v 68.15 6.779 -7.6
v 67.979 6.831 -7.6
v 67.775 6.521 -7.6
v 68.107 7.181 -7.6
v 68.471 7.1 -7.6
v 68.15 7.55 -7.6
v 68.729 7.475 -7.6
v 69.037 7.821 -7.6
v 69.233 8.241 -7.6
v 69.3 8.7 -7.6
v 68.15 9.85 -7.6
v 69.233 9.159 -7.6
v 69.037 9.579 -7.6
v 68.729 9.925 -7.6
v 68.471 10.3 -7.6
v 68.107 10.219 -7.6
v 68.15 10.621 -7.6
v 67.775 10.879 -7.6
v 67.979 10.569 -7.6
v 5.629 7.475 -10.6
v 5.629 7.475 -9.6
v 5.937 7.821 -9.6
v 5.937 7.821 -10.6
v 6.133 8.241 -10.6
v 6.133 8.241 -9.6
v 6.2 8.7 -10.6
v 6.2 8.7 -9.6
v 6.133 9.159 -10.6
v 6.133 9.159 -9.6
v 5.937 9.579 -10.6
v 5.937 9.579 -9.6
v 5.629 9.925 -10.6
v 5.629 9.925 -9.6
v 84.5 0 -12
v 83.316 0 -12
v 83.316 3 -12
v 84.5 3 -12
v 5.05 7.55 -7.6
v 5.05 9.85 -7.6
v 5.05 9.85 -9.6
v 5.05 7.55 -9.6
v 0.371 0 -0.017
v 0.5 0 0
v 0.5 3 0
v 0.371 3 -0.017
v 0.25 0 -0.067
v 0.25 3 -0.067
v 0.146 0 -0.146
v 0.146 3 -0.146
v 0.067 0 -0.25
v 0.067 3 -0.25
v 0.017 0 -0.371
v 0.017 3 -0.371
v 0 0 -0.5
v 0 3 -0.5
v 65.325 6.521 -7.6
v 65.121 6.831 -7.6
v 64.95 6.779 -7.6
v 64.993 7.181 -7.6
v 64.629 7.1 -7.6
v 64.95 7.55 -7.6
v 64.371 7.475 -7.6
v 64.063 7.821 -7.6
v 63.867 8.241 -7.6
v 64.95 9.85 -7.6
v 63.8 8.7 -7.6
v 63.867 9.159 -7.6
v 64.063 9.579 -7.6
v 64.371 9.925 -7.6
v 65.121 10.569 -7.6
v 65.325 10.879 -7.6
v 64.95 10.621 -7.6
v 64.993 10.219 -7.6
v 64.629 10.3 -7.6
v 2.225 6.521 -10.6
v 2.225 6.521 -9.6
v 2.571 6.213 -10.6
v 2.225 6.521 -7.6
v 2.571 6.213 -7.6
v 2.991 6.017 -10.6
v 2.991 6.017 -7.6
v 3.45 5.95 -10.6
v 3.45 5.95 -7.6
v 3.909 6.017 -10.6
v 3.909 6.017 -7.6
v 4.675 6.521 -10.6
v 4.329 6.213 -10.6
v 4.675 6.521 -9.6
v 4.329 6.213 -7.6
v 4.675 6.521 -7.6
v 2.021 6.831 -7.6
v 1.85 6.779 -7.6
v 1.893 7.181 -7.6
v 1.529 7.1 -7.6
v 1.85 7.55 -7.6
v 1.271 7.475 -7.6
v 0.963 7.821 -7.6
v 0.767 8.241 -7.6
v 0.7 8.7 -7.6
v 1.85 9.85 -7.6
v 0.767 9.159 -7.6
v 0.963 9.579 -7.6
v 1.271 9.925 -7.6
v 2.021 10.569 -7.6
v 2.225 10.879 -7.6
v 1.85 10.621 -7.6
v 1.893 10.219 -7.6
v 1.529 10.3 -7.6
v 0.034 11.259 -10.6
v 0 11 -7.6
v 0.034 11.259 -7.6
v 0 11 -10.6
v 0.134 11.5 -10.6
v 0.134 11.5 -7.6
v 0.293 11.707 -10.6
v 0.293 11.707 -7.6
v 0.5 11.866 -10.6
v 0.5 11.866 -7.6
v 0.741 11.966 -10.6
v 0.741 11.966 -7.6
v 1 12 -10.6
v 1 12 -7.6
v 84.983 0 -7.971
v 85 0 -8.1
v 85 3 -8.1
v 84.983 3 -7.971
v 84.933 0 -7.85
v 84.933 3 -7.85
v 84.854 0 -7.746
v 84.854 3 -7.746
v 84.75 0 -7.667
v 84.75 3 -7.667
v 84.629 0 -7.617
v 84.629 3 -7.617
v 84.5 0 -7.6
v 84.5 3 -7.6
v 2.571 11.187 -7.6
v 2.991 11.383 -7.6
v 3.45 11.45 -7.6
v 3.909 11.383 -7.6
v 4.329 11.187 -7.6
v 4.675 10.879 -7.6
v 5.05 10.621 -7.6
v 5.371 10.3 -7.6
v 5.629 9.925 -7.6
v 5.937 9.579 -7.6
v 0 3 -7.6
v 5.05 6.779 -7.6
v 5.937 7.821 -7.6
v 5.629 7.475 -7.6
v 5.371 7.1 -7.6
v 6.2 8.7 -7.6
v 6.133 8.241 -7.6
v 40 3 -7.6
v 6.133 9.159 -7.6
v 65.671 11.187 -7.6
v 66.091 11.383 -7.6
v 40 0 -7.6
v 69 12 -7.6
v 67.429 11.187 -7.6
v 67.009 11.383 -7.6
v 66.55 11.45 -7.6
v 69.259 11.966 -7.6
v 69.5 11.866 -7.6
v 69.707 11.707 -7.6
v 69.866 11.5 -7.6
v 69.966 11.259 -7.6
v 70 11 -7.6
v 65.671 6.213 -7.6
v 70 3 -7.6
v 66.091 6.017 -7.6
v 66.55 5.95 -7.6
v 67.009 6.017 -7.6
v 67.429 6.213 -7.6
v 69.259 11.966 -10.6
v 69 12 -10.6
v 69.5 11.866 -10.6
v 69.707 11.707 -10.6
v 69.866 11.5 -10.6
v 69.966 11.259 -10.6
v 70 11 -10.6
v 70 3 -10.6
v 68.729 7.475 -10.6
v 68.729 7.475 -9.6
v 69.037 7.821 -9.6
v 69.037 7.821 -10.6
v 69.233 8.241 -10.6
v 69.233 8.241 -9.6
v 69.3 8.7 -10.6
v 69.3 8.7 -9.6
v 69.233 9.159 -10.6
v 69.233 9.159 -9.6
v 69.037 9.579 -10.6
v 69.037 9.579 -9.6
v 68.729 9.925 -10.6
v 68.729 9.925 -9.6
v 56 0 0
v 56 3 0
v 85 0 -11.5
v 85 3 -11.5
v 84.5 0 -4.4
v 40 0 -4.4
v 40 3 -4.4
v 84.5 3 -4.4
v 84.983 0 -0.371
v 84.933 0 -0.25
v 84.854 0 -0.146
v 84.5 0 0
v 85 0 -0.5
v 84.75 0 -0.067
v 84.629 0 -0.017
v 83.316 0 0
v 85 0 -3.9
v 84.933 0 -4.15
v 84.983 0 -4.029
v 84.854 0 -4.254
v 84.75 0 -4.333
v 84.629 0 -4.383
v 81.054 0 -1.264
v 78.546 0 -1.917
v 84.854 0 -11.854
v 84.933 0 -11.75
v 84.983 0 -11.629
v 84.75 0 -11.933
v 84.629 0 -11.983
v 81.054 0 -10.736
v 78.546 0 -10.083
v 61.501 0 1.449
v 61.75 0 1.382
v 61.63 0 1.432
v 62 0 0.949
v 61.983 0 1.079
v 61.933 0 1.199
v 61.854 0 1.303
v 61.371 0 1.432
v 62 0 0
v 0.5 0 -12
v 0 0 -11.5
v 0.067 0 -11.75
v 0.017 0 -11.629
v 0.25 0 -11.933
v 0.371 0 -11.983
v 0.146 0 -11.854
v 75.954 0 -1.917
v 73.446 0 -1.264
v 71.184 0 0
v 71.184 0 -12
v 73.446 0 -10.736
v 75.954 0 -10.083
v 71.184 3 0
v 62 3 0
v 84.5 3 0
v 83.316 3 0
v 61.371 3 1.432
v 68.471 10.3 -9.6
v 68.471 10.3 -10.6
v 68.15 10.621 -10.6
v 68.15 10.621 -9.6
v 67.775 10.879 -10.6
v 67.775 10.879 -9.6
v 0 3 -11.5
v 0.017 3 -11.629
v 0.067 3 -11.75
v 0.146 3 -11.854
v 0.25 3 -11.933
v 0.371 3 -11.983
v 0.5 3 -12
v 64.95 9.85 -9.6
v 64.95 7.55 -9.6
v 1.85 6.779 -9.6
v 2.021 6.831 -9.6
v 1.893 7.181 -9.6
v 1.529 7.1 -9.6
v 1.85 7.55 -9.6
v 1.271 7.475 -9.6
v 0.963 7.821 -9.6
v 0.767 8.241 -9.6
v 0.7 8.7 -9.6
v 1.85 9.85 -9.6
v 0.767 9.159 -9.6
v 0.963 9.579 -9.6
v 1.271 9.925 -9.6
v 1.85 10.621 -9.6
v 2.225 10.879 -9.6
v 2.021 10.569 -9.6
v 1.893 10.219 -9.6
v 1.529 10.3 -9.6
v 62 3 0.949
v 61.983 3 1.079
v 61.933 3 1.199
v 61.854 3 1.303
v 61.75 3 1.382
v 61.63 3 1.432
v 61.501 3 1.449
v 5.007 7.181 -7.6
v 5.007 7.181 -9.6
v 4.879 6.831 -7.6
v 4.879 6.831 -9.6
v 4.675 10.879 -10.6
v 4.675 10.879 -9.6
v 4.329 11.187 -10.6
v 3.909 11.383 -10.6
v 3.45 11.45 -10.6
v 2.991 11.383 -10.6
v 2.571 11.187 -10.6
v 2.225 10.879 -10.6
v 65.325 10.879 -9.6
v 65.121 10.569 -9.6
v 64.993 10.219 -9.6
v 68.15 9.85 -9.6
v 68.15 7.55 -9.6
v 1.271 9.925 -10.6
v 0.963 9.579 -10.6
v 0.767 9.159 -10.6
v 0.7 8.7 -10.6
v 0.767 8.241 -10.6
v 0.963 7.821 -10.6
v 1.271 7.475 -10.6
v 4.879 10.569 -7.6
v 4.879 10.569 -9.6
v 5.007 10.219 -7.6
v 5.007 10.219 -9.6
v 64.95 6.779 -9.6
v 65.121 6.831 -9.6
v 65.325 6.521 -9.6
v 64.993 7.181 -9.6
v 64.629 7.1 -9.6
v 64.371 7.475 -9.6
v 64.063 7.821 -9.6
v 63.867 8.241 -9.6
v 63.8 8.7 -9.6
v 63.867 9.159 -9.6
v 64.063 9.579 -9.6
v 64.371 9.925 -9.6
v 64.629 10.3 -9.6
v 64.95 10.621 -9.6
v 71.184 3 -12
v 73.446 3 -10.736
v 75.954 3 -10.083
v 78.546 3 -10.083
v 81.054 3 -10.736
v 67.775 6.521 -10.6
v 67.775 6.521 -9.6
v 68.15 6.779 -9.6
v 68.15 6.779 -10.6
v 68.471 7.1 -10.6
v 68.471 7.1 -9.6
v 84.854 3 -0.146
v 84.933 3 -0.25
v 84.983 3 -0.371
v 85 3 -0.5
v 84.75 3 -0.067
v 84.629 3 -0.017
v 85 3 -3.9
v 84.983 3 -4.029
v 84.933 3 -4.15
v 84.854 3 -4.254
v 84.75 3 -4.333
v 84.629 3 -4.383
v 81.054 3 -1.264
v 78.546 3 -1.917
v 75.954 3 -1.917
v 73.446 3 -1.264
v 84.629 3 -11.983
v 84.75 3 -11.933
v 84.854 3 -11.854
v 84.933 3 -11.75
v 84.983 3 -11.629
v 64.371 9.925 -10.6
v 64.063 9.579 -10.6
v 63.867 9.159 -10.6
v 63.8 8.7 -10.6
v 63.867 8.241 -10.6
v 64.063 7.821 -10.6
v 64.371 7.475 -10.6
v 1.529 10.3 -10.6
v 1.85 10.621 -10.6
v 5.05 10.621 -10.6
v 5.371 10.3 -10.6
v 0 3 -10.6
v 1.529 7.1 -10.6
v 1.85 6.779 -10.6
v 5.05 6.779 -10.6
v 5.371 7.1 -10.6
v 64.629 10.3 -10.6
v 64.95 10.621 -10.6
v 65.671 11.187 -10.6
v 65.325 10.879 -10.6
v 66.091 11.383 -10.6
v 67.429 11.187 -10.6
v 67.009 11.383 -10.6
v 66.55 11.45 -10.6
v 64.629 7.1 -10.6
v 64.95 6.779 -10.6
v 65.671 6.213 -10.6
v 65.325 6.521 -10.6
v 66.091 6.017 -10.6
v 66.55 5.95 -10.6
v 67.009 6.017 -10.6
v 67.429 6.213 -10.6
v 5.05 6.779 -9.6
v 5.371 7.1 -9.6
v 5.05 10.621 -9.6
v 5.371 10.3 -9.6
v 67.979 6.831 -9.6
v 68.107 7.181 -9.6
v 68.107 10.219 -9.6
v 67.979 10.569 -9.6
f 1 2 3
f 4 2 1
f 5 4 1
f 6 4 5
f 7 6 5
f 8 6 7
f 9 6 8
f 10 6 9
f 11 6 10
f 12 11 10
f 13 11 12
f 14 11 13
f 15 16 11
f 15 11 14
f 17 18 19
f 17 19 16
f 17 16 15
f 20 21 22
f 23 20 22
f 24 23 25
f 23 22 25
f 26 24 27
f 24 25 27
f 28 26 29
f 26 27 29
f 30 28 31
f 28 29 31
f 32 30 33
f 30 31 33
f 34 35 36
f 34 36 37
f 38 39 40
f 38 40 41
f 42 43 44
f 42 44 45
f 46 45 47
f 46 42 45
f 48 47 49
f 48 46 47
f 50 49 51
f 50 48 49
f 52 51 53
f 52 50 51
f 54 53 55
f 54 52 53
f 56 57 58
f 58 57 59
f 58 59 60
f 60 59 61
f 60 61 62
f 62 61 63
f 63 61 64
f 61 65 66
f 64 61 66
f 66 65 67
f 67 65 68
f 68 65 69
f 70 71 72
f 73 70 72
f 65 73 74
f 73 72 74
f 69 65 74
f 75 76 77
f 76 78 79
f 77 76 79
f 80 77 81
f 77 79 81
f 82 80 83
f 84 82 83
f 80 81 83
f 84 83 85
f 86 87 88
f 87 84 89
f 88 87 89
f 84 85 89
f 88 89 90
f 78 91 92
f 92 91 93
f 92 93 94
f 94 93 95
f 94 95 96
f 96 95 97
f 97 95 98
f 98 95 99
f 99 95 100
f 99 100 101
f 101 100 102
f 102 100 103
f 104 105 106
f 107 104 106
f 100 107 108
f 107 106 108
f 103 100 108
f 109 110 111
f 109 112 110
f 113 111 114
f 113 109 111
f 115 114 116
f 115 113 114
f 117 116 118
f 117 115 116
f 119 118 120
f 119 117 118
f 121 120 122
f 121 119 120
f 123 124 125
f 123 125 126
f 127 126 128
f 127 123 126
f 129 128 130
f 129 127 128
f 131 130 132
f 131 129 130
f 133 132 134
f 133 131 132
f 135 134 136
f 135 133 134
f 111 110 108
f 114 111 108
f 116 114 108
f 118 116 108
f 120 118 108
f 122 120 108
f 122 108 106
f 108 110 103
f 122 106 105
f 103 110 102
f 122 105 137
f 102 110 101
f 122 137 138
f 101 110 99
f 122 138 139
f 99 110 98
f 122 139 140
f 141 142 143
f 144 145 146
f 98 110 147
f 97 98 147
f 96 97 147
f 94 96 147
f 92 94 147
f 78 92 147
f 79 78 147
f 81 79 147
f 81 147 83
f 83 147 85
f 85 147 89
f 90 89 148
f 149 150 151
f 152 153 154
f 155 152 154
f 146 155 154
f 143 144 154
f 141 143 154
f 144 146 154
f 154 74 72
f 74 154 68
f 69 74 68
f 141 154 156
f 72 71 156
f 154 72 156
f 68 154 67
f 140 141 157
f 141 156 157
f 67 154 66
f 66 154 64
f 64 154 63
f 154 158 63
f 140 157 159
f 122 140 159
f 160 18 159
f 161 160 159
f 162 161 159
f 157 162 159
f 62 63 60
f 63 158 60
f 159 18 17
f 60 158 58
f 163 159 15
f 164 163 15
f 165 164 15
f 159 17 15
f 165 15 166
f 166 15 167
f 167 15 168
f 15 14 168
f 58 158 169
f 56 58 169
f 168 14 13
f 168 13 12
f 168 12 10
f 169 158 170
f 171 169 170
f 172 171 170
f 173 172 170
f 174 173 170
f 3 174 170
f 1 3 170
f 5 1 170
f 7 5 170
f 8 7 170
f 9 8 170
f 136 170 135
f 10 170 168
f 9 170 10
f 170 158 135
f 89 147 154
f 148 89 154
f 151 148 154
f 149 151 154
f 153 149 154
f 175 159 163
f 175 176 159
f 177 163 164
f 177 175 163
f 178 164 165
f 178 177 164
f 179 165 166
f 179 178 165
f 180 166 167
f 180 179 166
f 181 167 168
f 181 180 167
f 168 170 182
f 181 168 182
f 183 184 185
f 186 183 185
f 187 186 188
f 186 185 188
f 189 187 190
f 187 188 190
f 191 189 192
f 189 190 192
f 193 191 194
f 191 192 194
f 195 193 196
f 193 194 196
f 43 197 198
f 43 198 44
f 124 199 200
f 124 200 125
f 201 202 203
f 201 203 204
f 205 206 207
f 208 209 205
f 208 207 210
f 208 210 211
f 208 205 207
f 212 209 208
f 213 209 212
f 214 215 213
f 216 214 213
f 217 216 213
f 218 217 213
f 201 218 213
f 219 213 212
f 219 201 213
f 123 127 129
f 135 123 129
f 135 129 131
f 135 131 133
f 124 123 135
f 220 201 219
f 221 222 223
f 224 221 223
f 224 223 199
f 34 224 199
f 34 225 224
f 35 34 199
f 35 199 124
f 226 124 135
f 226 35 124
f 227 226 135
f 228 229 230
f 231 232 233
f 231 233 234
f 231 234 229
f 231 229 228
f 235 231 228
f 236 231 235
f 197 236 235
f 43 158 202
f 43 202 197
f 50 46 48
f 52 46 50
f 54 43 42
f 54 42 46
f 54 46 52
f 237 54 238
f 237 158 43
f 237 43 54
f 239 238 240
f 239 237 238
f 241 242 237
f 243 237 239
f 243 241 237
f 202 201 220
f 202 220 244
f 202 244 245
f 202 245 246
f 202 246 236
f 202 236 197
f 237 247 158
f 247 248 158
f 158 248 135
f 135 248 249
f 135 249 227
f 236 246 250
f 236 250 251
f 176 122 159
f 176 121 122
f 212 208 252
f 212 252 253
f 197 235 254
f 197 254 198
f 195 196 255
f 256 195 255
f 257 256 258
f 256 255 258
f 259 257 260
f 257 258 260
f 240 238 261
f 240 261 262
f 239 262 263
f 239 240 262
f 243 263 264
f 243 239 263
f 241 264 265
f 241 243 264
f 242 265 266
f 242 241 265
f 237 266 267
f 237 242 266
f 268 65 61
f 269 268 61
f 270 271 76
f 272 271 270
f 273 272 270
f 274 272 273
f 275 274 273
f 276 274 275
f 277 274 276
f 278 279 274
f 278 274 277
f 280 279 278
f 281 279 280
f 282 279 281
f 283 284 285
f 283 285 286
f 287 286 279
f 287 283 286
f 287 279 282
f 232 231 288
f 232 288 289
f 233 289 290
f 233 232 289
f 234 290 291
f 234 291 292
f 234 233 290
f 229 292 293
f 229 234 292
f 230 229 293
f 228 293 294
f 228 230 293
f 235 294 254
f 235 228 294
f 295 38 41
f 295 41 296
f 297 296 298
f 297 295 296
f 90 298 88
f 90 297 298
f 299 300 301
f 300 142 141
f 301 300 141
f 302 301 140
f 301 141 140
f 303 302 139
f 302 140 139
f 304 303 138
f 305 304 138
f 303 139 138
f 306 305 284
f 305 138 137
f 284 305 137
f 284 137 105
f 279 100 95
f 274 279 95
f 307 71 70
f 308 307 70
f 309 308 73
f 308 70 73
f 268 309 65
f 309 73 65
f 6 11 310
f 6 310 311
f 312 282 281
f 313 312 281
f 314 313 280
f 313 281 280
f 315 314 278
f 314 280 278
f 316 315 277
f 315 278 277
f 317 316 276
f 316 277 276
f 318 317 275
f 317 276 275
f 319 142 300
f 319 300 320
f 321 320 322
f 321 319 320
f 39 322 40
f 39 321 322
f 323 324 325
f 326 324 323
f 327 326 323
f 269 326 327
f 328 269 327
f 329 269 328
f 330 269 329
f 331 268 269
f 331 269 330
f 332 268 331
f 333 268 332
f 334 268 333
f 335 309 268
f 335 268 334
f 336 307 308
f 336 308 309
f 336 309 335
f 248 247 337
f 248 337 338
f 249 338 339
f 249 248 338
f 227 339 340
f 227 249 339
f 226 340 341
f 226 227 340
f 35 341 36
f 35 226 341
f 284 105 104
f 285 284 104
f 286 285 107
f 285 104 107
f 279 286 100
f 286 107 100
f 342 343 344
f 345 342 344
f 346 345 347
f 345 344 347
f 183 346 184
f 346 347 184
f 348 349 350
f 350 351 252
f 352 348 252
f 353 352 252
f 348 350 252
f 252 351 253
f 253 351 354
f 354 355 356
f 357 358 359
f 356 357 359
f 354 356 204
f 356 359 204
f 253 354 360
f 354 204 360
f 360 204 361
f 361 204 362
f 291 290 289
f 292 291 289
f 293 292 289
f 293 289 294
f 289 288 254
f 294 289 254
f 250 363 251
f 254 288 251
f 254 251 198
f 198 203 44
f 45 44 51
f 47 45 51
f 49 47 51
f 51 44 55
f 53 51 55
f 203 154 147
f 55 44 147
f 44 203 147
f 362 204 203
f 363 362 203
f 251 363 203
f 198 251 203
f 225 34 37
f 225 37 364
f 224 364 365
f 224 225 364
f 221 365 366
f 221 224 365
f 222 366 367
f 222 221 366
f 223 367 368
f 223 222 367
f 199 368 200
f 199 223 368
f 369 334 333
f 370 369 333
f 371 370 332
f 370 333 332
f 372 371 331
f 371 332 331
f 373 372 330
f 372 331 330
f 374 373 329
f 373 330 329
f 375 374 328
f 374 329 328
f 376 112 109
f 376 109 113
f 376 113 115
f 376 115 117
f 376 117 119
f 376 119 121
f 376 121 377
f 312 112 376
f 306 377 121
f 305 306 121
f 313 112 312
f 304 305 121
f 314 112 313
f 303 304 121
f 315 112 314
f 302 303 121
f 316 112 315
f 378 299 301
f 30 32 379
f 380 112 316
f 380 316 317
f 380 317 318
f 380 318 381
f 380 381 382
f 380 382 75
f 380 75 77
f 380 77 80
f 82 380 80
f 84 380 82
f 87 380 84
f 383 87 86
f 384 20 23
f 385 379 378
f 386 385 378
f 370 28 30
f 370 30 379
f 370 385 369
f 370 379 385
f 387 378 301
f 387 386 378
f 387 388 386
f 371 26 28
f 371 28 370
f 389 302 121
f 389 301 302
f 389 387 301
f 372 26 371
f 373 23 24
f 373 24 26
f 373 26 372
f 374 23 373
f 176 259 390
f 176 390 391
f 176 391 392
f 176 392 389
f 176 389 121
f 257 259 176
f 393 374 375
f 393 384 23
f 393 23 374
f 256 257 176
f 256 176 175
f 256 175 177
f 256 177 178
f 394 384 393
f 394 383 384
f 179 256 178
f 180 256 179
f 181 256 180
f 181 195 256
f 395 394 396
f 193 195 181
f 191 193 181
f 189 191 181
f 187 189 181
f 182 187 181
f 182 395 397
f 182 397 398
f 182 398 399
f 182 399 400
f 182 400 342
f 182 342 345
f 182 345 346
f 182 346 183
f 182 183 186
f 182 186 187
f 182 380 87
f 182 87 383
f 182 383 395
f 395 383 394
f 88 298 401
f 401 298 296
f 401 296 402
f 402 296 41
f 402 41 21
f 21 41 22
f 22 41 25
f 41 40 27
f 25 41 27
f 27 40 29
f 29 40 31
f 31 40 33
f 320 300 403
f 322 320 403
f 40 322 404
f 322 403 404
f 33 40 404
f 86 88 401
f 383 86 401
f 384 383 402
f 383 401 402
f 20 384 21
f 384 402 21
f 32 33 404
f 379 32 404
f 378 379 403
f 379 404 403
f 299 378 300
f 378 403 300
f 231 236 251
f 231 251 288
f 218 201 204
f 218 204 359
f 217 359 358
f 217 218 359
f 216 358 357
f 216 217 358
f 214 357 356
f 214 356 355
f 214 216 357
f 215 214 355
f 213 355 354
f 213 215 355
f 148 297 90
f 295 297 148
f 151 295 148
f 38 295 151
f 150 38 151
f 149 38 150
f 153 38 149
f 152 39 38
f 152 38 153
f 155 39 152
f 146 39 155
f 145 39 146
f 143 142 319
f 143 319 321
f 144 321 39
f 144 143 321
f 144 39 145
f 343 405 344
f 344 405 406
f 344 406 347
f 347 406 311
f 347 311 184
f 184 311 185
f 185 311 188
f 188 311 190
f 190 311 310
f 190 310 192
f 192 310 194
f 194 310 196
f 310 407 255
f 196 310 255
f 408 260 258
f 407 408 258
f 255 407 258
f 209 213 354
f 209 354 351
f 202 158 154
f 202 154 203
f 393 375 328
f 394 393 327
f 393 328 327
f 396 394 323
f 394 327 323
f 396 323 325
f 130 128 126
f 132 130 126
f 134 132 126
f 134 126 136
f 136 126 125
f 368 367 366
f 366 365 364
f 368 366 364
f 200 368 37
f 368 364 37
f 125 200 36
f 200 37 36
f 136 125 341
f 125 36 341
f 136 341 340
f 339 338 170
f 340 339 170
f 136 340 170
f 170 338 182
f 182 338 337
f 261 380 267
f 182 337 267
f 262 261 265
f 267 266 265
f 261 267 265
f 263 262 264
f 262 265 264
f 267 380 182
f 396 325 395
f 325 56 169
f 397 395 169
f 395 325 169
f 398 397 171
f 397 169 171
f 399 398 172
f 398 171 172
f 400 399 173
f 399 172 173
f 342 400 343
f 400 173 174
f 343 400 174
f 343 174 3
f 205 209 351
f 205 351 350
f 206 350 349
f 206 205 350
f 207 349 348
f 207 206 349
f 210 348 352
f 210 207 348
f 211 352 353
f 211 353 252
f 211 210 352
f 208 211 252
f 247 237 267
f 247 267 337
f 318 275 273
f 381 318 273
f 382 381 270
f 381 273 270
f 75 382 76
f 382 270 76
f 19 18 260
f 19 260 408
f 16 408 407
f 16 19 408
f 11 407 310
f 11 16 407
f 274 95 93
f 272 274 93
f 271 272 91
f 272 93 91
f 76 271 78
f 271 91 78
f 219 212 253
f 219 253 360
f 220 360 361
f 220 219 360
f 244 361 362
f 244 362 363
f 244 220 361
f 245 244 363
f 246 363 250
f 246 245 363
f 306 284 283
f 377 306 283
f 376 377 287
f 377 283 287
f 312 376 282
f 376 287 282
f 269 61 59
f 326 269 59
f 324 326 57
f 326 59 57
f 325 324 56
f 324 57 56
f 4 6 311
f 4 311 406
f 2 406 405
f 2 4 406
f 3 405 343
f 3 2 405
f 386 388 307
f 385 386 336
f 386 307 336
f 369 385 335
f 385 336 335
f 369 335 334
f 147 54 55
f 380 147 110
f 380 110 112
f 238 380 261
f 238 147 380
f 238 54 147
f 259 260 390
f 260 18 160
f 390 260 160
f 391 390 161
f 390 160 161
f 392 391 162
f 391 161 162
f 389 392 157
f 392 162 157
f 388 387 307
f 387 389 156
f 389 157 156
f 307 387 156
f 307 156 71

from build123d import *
from build123d.topology import SkipClean

# Parameters (mm, degrees)
EXTRUDE_1_DEPTH     = 3
SKETCH_4_W          = 70
SKETCH_4_H          = 3
EXTRUDE_2_DEPTH     = 9
CUT_EXTRUDE_1_REACH = 88.319
FILLET_1_R          = 1
EXTRUDE_3_DEPTH     = 2


with BuildPart() as part:
    # ｽｹｯﾁ2 → ﾎﾞｽ - 押し出し1 (new body)
    with BuildSketch(Plane(origin=(0, 0, 0), x_dir=(1, 0, 0), z_dir=(0, 1, 0))):
        with BuildLine():
            Line((70, 7.6), (40, 7.6))
            Line((40, 7.6), (40, 4.4))
            Line((40, 4.4), (70, 4.4))
            Line((70, 4.4), (84.5, 4.4))
            ThreePointArc((84.5, 4.4), (84.853553391, 4.253553391), (85, 3.9))
            Line((85, 3.9), (85, 0.5))
            ThreePointArc((85, 0.5), (84.853553391, 0.146446609), (84.5, 0))
            Line((84.5, 0), (83.316300355, 0))
            ThreePointArc((83.316300355, 0), (77.25, 2), (71.183699645, 0))
            Line((71.183699645, 0), (70, 0))
            Line((70, 0), (62, 0))
            Line((62, 0), (62, -0.949194177))
            ThreePointArc((62, -0.949194177), (61.80461807, -1.345688605), (61.371168675, -1.432311647))
            Line((61.371168675, -1.432311647), (56, 0))
            Line((56, 0), (0.5, 0))
            ThreePointArc((0.5, 0), (0.146446609, 0.146446609), (0, 0.5))
            Line((0, 0.5), (0, 11.5))
            ThreePointArc((0, 11.5), (0.146446609, 11.853553391), (0.5, 12))
            Line((0.5, 12), (70, 12))
            Line((70, 12), (71.183699645, 12))
            ThreePointArc((71.183699645, 12), (77.25, 10), (83.316300355, 12))
            Line((83.316300355, 12), (84.5, 12))
            ThreePointArc((84.5, 12), (84.853553391, 11.853553391), (85, 11.5))
            Line((85, 11.5), (85, 8.1))
            ThreePointArc((85, 8.1), (84.853553391, 7.746446609), (84.5, 7.6))
            Line((84.5, 7.6), (70, 7.6))
        make_face()
    extrude(amount=EXTRUDE_1_DEPTH)

    # ｽｹｯﾁ4 → ﾎﾞｽ - 押し出し2 (add)
    with BuildSketch(Plane(origin=(0, 3, 0), x_dir=(1, 0, 0), z_dir=(0, 1, 0))):
        with Locations((35, 9.1)):
            Rectangle(SKETCH_4_W, SKETCH_4_H)
    extrude(amount=EXTRUDE_2_DEPTH)

    # ｽｹｯﾁ5 → ｶｯﾄ - 押し出し1 (cut, up to next)
    with BuildSketch(Plane.XY.offset(-7.6), mode=Mode.PRIVATE) as cut_extrude_1_sk1:
        with BuildLine():
            ThreePointArc((64.370652174, 9.924925734), (63.8, 8.7), (64.370652174, 7.475074266))
            ThreePointArc((64.370652174, 7.475074266), (64.782233047, 6.932233047), (65.325074266, 6.520652174))
            ThreePointArc((65.325074266, 6.520652174), (66.55, 5.95), (67.774925734, 6.520652174))
            ThreePointArc((67.774925734, 6.520652174), (68.317766953, 6.932233047), (68.729347826, 7.475074266))
            ThreePointArc((68.729347826, 7.475074266), (69.3, 8.7), (68.729347826, 9.924925734))
            ThreePointArc((68.729347826, 9.924925734), (68.317766953, 10.467766953), (67.774925734, 10.879347826))
            ThreePointArc((67.774925734, 10.879347826), (66.55, 11.45), (65.325074266, 10.879347826))
            ThreePointArc((65.325074266, 10.879347826), (64.782233047, 10.467766953), (64.370652174, 9.924925734))
        make_face()
    cut_extrude_1_tool1 = extrude(cut_extrude_1_sk1.sketch, amount=-CUT_EXTRUDE_1_REACH, mode=Mode.PRIVATE) & part.part
    # ｽｹｯﾁ5 → ｶｯﾄ - 押し出し1 (cut, up to next)
    with BuildSketch(Plane.XY.offset(-7.6), mode=Mode.PRIVATE) as cut_extrude_1_sk2:
        with BuildLine():
            ThreePointArc((5.629347826, 7.475074266), (6.2, 8.7), (5.629347826, 9.924925734))
            ThreePointArc((5.629347826, 9.924925734), (5.217766953, 10.467766953), (4.674925734, 10.879347826))
            ThreePointArc((4.674925734, 10.879347826), (3.45, 11.45), (2.225074266, 10.879347826))
            ThreePointArc((2.225074266, 10.879347826), (1.682233047, 10.467766953), (1.270652174, 9.924925734))
            ThreePointArc((1.270652174, 9.924925734), (0.7, 8.7), (1.270652174, 7.475074266))
            ThreePointArc((1.270652174, 7.475074266), (1.682233047, 6.932233047), (2.225074266, 6.520652174))
            ThreePointArc((2.225074266, 6.520652174), (3.45, 5.95), (4.674925734, 6.520652174))
            ThreePointArc((4.674925734, 6.520652174), (5.217766953, 6.932233047), (5.629347826, 7.475074266))
        make_face()
    cut_extrude_1_tool2 = extrude(cut_extrude_1_sk2.sketch, amount=-CUT_EXTRUDE_1_REACH, mode=Mode.PRIVATE) & part.part
    add(cut_extrude_1_tool1.solids().sort_by_distance((66.55, 8.7, -7.6))[0], mode=Mode.SUBTRACT)
    add(cut_extrude_1_tool2.solids().sort_by_distance((3.45, 8.7, -7.6))[0], mode=Mode.SUBTRACT)

    # ﾌｨﾚｯﾄ1
    fillet_1_edges = [part.edges().sort_by_distance(p)[0] for p in [
        (70, 12, -9.1),
        (0, 12, -9.1),
    ]]
    fillet(fillet_1_edges, radius=FILLET_1_R)

    # ｽｹｯﾁ6 → ﾎﾞｽ - 押し出し3 (add)
    with SkipClean():  # the faces are left unmerged after this step: merging them gives an invalid solid
        with BuildSketch(Plane.XY.offset(-7.6)):
            with BuildLine():
                Line((1.85, 9.85), (1.85, 7.55))
                ThreePointArc((1.85, 7.55), (1.946690123, 7.002223209), (2.225074266, 6.520652174))
                ThreePointArc((2.225074266, 6.520652174), (1.682233047, 6.932233047), (1.270652174, 7.475074266))
                ThreePointArc((1.270652174, 7.475074266), (0.7, 8.7), (1.270652174, 9.924925734))
                ThreePointArc((1.270652174, 9.924925734), (1.682233047, 10.467766953), (2.225074266, 10.879347826))
                ThreePointArc((2.225074266, 10.879347826), (1.946690123, 10.397776791), (1.85, 9.85))
            make_face()
            with BuildLine():
                Line((5.05, 9.85), (5.05, 7.55))
                ThreePointArc((5.05, 7.55), (4.953309877, 7.002223209), (4.674925734, 6.520652174))
                ThreePointArc((4.674925734, 6.520652174), (5.217766953, 6.932233047), (5.629347826, 7.475074266))
                ThreePointArc((5.629347826, 7.475074266), (6.2, 8.7), (5.629347826, 9.924925734))
                ThreePointArc((5.629347826, 9.924925734), (5.217766953, 10.467766953), (4.674925734, 10.879347826))
                ThreePointArc((4.674925734, 10.879347826), (4.953309877, 10.397776791), (5.05, 9.85))
            make_face()
            with BuildLine():
                Line((64.95, 9.85), (64.95, 7.55))
                ThreePointArc((64.95, 7.55), (65.046690123, 7.002223209), (65.325074266, 6.520652174))
                ThreePointArc((65.325074266, 6.520652174), (64.782233047, 6.932233047), (64.370652174, 7.475074266))
                ThreePointArc((64.370652174, 7.475074266), (63.8, 8.7), (64.370652174, 9.924925734))
                ThreePointArc((64.370652174, 9.924925734), (64.782233047, 10.467766953), (65.325074266, 10.879347826))
                ThreePointArc((65.325074266, 10.879347826), (65.046690123, 10.397776791), (64.95, 9.85))
            make_face()
            with BuildLine():
                Line((68.15, 9.85), (68.15, 7.55))
                ThreePointArc((68.15, 7.55), (68.053309877, 7.002223209), (67.774925734, 6.520652174))
                ThreePointArc((67.774925734, 6.520652174), (68.317766953, 6.932233047), (68.729347826, 7.475074266))
                ThreePointArc((68.729347826, 7.475074266), (69.3, 8.7), (68.729347826, 9.924925734))
                ThreePointArc((68.729347826, 9.924925734), (68.317766953, 10.467766953), (67.774925734, 10.879347826))
                ThreePointArc((67.774925734, 10.879347826), (68.053309877, 10.397776791), (68.15, 9.85))
            make_face()
        extrude(amount=-EXTRUDE_3_DEPTH)


solid = part.part
